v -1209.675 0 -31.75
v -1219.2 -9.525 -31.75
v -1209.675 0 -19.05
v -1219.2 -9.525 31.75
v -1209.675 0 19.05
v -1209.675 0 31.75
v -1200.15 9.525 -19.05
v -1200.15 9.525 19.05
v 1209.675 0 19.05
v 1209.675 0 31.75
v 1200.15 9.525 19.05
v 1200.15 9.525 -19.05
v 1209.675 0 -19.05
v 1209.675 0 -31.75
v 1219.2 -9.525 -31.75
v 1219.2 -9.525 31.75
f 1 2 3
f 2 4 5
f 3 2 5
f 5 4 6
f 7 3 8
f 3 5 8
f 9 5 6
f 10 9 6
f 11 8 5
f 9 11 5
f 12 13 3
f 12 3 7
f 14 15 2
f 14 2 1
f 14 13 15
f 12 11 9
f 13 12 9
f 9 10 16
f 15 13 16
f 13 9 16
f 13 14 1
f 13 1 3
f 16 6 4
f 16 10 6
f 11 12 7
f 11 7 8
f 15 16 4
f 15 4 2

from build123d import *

# Parameters (mm, degrees)
F1_DEPTH      = 1219.2
F1_DEPTH_BACK = 1219.2
F3_DEPTH      = 63.501


with BuildPart() as f1:
    # F0 (on Right) → F1 (new body, two sides)
    with BuildSketch(Plane.YZ) as f1_sk:
        Polygon((0, 31.75), (-9.525, 31.75), (-9.525, -31.75), (0, -31.75), (0, -19.05), (9.525, -19.05), (9.525, 19.05), (0, 19.05), align=None)
    extrude(amount=F1_DEPTH)
    extrude(f1_sk.sketch, amount=-F1_DEPTH_BACK)

    # F2 (on face) → F3 (cut, through all)
    with BuildSketch(Plane.XY.offset(31.75)):
        Polygon((-1219.2, 0), (-1209.675, 0), (-1200.15, 9.525), (-1219.2, 9.525), align=None)
        Polygon((-1219.2, 0), (-1219.2, -9.525), (-1209.675, 0), align=None)
        Polygon((1200.15, 9.525), (1209.675, 0), (1219.2, 0), (1219.2, 9.525), align=None)
        Polygon((1209.675, 0), (1219.2, -9.525), (1219.2, 0), align=None)
    extrude(amount=-F3_DEPTH, mode=Mode.SUBTRACT)


solid = f1.part
